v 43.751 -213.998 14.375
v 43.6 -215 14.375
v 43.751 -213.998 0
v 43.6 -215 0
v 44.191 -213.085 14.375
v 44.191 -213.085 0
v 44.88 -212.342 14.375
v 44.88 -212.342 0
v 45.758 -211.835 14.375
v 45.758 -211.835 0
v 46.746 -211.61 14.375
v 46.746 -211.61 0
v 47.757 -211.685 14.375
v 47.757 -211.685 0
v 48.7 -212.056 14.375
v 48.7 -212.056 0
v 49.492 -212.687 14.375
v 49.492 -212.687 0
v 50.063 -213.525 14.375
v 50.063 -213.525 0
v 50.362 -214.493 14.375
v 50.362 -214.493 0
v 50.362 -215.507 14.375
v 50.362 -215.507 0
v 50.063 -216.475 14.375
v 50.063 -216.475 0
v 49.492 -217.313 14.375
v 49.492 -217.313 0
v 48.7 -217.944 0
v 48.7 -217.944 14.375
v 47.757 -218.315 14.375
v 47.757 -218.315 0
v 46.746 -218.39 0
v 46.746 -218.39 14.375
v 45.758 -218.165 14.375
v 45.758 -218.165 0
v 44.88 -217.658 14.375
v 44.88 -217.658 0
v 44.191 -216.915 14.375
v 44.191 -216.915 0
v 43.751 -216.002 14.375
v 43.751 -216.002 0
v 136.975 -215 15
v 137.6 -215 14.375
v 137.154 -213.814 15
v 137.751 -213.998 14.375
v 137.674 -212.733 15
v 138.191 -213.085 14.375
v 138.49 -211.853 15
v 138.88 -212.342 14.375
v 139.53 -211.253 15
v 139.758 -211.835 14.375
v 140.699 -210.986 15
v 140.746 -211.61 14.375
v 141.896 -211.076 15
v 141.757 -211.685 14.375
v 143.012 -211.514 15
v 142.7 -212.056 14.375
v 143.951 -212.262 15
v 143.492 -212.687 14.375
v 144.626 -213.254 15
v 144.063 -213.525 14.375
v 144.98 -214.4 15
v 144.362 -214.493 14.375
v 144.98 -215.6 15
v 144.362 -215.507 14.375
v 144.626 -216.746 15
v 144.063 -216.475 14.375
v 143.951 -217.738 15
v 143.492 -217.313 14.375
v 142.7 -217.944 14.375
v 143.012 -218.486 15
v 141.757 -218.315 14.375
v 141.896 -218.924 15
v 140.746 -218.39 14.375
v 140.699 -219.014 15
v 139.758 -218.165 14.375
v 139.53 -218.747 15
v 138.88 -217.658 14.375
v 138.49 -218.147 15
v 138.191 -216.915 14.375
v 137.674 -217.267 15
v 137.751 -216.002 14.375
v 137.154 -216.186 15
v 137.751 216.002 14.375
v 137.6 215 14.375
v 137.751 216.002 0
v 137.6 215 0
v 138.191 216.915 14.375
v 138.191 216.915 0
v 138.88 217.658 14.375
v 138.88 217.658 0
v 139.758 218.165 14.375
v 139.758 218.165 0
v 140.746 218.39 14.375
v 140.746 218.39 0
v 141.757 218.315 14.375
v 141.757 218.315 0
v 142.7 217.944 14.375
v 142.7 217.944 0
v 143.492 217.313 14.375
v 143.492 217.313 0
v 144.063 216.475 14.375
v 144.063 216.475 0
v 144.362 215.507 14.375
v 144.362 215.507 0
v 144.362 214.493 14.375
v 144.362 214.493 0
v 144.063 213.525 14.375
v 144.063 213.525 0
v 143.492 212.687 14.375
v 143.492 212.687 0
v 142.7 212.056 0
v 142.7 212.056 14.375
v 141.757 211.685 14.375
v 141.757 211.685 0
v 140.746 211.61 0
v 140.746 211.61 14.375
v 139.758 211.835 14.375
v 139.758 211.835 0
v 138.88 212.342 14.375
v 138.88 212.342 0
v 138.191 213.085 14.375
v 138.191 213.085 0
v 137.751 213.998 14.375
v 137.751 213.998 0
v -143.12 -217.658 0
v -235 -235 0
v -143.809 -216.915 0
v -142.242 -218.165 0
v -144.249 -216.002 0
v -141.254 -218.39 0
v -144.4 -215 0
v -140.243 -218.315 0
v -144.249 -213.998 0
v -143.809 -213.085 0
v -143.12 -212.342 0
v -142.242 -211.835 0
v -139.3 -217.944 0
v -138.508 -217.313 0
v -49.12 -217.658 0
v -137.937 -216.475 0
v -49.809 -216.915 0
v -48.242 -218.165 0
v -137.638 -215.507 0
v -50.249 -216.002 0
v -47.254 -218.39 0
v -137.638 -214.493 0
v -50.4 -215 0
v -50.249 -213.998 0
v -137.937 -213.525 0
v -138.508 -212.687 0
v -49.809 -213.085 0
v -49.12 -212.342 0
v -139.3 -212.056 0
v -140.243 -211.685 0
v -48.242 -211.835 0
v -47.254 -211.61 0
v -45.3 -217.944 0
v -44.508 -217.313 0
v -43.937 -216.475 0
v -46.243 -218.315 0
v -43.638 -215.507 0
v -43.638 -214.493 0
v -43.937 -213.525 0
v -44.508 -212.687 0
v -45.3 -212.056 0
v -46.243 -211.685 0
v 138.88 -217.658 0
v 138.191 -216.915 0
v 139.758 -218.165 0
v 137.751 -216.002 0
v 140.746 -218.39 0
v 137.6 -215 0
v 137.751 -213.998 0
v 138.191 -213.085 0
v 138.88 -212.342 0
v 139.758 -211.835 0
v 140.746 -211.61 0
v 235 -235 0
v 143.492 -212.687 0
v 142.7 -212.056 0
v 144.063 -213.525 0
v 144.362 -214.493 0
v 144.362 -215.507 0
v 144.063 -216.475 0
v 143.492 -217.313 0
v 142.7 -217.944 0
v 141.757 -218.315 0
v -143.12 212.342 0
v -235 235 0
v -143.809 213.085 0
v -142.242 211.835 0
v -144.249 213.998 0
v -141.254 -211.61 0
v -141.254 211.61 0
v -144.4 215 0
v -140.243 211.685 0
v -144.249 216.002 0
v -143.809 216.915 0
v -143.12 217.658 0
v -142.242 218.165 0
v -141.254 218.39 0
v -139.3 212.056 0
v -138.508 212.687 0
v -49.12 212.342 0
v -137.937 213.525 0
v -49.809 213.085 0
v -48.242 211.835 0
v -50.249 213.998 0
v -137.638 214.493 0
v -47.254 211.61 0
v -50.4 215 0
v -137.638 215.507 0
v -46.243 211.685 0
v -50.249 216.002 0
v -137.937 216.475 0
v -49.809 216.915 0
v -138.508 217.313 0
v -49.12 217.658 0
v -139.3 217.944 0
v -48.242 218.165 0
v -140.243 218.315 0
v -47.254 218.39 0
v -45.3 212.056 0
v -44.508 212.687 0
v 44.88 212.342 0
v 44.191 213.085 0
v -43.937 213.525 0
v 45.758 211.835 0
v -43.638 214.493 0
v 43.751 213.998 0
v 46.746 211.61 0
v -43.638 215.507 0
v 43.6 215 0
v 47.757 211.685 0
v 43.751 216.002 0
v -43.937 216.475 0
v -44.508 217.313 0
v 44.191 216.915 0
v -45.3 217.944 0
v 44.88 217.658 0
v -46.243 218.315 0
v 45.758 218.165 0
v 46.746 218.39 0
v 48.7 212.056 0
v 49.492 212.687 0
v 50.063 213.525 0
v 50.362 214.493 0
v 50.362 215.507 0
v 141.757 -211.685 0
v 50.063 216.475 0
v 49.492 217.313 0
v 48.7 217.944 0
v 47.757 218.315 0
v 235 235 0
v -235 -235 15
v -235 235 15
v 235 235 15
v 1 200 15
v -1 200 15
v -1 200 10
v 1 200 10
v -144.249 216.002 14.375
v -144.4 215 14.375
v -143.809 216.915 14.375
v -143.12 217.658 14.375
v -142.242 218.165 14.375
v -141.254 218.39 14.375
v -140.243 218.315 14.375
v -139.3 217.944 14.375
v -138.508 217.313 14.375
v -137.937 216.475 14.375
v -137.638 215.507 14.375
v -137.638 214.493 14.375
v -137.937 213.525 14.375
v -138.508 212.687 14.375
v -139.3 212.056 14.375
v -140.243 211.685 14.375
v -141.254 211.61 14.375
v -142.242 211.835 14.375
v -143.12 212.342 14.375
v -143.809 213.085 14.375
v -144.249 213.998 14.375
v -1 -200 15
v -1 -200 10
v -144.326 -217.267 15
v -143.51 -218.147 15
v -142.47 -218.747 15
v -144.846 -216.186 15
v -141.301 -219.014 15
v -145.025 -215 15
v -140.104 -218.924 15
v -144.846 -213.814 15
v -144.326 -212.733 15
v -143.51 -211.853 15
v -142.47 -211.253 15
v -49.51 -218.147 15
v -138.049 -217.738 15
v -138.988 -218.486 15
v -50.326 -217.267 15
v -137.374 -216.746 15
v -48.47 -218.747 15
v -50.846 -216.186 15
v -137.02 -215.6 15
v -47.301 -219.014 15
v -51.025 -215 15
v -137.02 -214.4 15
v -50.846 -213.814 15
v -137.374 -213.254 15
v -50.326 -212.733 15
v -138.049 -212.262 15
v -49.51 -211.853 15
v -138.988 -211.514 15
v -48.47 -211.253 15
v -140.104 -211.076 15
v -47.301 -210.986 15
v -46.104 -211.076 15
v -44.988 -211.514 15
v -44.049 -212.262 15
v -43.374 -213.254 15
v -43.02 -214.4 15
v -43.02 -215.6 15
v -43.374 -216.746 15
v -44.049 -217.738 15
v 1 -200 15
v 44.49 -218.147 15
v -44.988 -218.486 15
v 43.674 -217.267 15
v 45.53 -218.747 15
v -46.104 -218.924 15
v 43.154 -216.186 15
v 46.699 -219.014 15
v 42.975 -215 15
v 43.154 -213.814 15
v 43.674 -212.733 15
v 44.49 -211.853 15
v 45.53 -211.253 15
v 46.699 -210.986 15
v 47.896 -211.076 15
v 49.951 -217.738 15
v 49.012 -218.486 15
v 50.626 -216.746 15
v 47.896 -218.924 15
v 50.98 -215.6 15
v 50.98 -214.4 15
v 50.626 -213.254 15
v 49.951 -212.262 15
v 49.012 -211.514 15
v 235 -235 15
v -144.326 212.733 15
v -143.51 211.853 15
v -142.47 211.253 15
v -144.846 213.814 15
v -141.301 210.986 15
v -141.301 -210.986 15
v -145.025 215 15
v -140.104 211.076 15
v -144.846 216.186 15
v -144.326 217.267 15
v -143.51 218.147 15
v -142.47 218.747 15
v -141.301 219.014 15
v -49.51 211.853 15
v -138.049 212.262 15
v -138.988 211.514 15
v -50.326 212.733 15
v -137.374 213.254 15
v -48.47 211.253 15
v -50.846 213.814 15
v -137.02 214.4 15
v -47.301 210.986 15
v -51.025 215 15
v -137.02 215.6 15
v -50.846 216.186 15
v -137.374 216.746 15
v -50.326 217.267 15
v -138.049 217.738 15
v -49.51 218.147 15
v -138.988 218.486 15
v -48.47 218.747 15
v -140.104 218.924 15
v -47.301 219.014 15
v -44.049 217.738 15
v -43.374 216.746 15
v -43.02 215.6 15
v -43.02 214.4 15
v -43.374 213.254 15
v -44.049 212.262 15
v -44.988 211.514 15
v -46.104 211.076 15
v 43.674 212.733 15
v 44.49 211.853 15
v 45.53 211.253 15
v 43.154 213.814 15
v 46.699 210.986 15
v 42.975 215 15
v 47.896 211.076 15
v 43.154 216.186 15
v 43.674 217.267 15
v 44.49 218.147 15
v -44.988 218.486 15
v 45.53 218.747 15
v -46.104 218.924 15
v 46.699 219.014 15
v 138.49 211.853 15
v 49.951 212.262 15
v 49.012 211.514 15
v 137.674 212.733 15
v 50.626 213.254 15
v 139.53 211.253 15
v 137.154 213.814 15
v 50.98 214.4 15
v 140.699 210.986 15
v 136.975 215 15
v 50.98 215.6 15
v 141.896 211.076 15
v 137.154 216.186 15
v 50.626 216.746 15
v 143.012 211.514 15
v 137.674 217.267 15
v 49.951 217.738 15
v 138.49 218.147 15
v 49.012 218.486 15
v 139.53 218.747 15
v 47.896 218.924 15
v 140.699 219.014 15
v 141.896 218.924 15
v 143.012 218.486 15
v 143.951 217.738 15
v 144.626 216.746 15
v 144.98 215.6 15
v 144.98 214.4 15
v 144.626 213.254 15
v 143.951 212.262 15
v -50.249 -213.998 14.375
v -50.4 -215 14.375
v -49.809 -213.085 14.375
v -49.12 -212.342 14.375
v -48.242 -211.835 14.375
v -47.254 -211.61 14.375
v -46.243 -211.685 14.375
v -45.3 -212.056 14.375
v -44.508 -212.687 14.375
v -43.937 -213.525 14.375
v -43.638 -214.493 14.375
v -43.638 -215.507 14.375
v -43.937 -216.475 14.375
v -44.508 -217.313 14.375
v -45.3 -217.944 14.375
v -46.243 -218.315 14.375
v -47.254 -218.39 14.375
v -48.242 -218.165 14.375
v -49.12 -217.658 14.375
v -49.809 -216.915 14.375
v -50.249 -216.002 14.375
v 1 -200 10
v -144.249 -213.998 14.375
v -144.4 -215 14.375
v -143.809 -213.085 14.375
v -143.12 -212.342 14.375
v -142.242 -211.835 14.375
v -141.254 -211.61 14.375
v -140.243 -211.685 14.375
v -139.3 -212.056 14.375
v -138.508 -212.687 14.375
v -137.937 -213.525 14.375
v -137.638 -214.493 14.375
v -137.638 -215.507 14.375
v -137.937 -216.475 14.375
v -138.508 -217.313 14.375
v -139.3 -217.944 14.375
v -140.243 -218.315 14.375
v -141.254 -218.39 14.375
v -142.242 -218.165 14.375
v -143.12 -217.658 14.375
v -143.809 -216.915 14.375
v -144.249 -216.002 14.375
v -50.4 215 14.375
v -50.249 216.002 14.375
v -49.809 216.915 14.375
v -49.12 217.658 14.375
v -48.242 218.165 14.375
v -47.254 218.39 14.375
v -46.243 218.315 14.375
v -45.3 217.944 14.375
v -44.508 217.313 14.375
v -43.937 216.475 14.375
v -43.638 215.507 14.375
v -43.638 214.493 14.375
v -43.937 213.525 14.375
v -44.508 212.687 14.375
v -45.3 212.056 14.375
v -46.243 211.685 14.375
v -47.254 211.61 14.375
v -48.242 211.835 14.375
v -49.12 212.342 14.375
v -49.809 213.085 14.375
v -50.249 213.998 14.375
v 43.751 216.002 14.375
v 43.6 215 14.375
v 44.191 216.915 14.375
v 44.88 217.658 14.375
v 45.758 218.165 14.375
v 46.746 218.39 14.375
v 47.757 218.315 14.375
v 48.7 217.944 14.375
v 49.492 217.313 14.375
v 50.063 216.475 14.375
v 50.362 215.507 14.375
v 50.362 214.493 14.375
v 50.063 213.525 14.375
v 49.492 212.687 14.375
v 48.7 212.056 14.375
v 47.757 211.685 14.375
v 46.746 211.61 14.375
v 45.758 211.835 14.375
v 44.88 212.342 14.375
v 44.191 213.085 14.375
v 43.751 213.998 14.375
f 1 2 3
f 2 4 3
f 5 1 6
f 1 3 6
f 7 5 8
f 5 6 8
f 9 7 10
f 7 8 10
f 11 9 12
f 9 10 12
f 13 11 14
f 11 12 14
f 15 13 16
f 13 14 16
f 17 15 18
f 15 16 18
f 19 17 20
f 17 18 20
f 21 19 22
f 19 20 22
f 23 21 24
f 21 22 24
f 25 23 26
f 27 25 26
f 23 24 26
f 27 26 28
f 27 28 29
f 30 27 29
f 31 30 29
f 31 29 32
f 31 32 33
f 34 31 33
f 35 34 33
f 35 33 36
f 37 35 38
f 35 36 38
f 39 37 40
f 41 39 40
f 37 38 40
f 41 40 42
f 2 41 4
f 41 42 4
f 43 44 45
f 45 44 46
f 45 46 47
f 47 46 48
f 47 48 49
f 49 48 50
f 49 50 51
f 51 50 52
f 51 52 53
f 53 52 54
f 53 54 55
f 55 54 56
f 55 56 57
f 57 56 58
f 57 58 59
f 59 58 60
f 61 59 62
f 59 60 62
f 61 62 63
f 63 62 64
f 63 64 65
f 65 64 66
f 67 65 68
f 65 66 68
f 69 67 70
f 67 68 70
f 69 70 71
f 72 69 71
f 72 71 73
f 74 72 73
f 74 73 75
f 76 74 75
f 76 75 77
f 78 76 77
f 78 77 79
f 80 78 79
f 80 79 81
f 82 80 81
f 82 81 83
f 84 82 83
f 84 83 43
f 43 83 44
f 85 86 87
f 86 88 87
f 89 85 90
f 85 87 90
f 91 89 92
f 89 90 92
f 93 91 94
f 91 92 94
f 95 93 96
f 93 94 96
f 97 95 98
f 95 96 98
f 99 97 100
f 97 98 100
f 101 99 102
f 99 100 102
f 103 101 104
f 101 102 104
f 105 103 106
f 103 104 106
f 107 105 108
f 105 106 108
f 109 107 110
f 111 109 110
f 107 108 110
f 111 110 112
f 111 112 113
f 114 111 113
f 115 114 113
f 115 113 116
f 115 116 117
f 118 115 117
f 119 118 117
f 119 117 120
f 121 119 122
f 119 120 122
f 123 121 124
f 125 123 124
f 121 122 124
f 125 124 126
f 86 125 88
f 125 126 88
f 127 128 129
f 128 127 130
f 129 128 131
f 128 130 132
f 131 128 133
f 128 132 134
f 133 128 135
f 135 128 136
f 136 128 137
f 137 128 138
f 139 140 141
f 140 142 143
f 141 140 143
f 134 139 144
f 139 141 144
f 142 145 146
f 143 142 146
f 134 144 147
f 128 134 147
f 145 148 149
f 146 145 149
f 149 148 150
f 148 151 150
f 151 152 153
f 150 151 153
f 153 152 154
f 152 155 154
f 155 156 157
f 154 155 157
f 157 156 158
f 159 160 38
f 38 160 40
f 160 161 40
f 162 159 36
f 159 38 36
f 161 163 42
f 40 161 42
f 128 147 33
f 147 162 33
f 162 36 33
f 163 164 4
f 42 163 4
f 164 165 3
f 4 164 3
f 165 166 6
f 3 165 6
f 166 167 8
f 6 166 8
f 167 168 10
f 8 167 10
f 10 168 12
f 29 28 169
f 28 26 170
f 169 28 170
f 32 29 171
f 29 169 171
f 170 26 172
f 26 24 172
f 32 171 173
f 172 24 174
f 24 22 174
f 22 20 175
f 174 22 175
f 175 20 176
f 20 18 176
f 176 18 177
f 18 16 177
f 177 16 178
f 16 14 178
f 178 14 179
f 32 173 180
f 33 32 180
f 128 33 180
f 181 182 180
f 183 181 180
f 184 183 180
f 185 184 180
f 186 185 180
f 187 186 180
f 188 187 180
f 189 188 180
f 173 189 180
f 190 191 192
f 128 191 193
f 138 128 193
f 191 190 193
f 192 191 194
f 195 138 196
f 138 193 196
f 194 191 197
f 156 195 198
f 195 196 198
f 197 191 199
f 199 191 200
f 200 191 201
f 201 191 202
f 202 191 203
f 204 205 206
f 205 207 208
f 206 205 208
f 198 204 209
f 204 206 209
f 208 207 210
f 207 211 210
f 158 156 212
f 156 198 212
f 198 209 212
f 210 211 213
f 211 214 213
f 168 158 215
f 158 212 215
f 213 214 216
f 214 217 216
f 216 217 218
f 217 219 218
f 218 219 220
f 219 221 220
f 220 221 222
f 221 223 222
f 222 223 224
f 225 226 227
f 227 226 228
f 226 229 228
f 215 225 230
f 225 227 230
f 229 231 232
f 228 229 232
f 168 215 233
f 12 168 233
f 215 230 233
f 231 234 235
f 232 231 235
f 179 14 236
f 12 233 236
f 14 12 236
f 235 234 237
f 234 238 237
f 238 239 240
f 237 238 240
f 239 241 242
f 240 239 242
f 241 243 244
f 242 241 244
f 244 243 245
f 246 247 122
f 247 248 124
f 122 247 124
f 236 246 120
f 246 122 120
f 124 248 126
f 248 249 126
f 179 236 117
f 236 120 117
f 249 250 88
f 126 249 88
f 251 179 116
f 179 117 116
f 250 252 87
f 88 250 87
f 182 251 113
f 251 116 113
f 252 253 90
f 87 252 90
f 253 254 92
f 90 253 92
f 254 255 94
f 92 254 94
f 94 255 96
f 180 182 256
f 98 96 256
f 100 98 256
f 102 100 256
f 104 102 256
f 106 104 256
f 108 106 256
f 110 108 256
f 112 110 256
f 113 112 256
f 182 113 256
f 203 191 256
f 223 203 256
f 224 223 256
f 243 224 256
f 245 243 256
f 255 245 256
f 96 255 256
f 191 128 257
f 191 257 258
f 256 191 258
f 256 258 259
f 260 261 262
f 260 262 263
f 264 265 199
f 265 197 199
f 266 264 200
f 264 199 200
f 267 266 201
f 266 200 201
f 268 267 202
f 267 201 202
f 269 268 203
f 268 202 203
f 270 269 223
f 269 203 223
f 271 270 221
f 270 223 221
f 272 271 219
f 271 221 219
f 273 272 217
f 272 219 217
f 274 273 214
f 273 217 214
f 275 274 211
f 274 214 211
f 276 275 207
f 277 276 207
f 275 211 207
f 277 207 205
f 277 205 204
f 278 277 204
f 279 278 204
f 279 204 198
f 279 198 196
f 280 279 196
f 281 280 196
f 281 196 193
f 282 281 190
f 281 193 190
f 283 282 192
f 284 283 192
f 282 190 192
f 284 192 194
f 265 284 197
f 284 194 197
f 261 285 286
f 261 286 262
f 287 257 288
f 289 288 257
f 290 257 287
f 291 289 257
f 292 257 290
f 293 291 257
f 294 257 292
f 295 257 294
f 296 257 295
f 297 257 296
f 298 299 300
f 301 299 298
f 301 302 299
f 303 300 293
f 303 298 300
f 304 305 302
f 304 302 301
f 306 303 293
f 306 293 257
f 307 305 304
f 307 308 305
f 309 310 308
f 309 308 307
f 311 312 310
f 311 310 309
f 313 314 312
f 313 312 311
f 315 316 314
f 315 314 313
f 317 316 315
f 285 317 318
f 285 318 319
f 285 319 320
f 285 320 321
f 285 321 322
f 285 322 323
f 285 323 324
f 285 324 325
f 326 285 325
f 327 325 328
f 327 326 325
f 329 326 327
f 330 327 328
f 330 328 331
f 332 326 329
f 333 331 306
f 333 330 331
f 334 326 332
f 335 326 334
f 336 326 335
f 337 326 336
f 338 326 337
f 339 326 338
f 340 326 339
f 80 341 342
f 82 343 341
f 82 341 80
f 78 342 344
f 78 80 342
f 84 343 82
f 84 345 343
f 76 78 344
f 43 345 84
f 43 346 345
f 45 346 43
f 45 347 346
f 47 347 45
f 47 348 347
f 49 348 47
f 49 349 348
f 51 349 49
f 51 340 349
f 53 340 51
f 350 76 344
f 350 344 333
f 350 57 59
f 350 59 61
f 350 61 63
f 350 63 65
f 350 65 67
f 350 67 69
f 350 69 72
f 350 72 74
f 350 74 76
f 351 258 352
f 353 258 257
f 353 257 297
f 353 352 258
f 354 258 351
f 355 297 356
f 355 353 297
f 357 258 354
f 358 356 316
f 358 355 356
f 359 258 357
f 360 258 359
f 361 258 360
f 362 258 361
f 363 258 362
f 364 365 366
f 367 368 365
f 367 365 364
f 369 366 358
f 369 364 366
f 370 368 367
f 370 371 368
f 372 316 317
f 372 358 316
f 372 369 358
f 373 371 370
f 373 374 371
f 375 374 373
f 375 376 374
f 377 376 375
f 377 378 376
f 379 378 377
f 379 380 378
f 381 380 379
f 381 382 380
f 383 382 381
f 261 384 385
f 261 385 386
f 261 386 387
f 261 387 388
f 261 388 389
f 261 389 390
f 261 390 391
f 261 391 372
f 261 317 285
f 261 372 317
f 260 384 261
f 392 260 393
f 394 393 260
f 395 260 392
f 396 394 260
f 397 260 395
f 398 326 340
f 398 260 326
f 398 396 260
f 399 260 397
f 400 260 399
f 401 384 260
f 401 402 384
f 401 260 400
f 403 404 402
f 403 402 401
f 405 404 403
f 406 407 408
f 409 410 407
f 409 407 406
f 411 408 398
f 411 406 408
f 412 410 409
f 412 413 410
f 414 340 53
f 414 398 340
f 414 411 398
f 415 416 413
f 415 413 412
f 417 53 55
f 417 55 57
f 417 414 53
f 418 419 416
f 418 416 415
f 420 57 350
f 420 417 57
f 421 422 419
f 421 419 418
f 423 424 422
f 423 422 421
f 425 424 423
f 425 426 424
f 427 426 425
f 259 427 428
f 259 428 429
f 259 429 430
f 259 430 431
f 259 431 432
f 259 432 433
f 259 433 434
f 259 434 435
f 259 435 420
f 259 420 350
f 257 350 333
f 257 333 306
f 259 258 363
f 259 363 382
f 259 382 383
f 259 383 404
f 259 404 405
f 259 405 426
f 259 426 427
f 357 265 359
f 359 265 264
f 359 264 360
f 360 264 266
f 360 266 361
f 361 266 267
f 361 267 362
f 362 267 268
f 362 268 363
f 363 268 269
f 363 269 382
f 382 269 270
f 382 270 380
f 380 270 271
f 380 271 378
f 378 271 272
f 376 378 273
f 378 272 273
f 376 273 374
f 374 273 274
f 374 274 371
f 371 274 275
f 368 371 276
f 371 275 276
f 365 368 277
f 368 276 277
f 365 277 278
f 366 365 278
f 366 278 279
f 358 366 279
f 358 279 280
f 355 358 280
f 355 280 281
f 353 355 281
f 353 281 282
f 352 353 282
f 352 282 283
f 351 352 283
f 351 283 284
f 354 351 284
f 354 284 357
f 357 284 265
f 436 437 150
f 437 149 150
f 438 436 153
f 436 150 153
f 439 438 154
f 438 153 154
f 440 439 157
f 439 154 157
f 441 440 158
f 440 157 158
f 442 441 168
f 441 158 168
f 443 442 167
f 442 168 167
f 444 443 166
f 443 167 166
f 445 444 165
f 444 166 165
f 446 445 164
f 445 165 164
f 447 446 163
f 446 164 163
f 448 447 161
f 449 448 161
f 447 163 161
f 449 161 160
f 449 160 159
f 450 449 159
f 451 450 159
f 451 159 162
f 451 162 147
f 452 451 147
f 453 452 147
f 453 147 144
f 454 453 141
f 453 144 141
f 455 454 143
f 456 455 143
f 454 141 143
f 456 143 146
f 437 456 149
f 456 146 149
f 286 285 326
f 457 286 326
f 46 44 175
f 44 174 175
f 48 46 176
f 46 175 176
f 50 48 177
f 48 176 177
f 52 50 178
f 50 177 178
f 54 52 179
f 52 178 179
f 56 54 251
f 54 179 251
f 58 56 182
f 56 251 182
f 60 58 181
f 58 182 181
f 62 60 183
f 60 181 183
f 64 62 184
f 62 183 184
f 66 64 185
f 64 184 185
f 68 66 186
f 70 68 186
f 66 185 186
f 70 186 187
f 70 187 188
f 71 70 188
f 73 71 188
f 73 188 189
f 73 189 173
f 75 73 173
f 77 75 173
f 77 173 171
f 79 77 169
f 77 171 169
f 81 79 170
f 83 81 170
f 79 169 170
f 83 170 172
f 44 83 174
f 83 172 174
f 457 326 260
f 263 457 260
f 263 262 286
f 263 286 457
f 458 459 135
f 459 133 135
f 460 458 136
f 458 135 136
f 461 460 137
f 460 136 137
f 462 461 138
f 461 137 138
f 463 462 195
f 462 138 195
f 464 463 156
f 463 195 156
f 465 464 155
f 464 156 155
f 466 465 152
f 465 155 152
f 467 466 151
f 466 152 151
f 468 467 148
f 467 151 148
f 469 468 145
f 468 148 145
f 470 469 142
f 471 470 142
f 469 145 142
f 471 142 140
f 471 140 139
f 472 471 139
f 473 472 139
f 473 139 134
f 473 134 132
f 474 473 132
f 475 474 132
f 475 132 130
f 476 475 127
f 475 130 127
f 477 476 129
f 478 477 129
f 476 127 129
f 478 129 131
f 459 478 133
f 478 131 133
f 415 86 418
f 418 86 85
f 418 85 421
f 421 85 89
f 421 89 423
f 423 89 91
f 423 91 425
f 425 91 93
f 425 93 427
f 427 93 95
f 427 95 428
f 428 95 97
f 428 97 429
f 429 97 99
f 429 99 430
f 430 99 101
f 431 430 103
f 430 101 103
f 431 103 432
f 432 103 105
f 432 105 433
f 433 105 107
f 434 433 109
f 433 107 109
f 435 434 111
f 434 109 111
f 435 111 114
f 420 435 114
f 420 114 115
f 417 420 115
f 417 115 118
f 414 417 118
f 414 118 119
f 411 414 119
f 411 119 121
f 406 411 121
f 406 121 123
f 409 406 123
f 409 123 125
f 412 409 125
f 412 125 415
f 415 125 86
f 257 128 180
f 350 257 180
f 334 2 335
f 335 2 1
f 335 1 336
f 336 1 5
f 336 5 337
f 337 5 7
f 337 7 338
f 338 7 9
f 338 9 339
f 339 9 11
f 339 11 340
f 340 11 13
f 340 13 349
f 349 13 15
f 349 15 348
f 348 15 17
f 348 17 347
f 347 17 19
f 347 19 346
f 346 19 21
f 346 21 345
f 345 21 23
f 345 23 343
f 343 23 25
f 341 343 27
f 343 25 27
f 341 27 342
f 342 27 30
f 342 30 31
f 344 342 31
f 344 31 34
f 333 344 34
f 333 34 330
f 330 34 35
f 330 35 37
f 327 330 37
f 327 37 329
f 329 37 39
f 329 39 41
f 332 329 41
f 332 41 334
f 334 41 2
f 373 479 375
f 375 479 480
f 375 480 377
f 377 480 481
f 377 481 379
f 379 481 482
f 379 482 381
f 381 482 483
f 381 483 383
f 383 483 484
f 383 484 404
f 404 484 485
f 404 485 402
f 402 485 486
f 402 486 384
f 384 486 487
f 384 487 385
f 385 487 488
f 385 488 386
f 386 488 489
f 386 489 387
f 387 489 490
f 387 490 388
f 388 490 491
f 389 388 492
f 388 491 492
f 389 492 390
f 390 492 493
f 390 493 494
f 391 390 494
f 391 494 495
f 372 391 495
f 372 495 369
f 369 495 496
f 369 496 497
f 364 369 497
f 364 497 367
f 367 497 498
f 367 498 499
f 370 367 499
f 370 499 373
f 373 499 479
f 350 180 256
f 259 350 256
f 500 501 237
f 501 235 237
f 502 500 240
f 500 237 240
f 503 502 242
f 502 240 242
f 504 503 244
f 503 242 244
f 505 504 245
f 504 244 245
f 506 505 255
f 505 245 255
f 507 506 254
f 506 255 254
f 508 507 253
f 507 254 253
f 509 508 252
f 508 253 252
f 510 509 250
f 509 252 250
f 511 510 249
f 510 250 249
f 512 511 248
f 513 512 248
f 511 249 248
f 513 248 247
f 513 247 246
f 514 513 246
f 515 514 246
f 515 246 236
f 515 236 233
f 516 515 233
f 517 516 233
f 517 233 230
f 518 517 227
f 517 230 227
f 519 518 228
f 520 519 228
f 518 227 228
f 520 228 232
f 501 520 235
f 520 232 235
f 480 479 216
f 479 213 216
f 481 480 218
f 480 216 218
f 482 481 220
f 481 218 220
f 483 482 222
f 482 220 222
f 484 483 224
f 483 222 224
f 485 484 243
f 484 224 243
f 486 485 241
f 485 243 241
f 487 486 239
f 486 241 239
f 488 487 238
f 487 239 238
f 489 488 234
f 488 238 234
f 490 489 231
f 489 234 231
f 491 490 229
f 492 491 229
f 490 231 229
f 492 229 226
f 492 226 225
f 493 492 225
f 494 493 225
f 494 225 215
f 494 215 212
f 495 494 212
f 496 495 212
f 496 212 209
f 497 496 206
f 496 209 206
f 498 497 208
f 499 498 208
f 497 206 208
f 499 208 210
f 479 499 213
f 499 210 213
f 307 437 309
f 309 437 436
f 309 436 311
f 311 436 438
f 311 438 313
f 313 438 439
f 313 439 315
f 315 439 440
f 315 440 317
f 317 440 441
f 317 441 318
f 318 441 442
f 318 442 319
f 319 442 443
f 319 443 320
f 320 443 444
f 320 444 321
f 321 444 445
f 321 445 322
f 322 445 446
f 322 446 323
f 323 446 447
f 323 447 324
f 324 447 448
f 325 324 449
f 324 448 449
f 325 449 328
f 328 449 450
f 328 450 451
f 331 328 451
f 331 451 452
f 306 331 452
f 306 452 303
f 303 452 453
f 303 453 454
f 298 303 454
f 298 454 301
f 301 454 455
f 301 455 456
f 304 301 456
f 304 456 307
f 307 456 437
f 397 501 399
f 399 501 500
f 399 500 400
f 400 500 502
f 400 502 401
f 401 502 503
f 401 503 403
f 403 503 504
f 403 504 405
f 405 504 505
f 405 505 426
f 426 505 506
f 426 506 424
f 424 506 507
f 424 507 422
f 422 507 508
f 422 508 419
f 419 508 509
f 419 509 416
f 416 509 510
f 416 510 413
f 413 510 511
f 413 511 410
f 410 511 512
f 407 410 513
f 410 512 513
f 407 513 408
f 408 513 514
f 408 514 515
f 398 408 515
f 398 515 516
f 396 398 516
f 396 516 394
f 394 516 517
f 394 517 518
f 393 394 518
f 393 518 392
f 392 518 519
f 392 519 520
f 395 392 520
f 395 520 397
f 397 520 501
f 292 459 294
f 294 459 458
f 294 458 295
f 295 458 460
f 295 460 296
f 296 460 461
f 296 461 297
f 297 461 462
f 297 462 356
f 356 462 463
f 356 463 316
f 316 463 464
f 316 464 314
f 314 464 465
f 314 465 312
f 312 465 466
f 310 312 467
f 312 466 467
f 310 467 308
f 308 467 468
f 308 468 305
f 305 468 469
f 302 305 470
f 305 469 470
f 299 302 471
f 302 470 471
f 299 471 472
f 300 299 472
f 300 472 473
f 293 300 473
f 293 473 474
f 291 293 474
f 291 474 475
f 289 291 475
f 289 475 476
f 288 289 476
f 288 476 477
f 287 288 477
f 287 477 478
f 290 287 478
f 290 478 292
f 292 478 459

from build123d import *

# Parameters (mm, degrees)
SCHIZZO1_W                      = 470
SCHIZZO1_H                      = 470
ESTRUSIONE_ESTRUSIONE1_DEPTH    = 15
FORO_FILETTATO_M8_1_D           = 6.8
FORO_FILETTATO_M8_1_DEPTH       = 22.25
FORO_FILETTATO_M8_1_CSINK_D     = 8.05
FORO_FILETTATO_M8_1_CSINK_ANGLE = 90
FORO_FILETTATO_M8_1_TIP         = 2.042926105
SCHIZZO11_W                     = 2
SCHIZZO11_H                     = 400
TAGLIO_ESTRUSIONE1_DEPTH        = 5


with BuildPart() as part:
    # Schizzo1 → Estrusione-Estrusione1 (new body)
    with BuildSketch(Plane.XY):
        Rectangle(SCHIZZO1_W, SCHIZZO1_H)
    extrude(amount=ESTRUSIONE_ESTRUSIONE1_DEPTH)

    # Foro filettato M8-1
    with Locations(Plane.XY.offset(15)):
        with Locations((-141, 215), (-47, 215), (47, 215), (141, 215), (-141, -215), (-47, -215), (141, -215), (47, -215)):
            CounterSinkHole(FORO_FILETTATO_M8_1_D / 2, FORO_FILETTATO_M8_1_CSINK_D / 2, depth=FORO_FILETTATO_M8_1_DEPTH, counter_sink_angle=FORO_FILETTATO_M8_1_CSINK_ANGLE)
            with Locations((0, 0, -(FORO_FILETTATO_M8_1_DEPTH + FORO_FILETTATO_M8_1_TIP / 2))):  # 118° drill point
                Cone(0, FORO_FILETTATO_M8_1_D / 2, FORO_FILETTATO_M8_1_TIP, mode=Mode.SUBTRACT)

    # Schizzo11 → Taglio-Estrusione1 (cut)
    with BuildSketch(Plane.XY.offset(15)):
        Rectangle(SCHIZZO11_W, SCHIZZO11_H)
    extrude(amount=-TAGLIO_ESTRUSIONE1_DEPTH, mode=Mode.SUBTRACT)


solid = part.part
